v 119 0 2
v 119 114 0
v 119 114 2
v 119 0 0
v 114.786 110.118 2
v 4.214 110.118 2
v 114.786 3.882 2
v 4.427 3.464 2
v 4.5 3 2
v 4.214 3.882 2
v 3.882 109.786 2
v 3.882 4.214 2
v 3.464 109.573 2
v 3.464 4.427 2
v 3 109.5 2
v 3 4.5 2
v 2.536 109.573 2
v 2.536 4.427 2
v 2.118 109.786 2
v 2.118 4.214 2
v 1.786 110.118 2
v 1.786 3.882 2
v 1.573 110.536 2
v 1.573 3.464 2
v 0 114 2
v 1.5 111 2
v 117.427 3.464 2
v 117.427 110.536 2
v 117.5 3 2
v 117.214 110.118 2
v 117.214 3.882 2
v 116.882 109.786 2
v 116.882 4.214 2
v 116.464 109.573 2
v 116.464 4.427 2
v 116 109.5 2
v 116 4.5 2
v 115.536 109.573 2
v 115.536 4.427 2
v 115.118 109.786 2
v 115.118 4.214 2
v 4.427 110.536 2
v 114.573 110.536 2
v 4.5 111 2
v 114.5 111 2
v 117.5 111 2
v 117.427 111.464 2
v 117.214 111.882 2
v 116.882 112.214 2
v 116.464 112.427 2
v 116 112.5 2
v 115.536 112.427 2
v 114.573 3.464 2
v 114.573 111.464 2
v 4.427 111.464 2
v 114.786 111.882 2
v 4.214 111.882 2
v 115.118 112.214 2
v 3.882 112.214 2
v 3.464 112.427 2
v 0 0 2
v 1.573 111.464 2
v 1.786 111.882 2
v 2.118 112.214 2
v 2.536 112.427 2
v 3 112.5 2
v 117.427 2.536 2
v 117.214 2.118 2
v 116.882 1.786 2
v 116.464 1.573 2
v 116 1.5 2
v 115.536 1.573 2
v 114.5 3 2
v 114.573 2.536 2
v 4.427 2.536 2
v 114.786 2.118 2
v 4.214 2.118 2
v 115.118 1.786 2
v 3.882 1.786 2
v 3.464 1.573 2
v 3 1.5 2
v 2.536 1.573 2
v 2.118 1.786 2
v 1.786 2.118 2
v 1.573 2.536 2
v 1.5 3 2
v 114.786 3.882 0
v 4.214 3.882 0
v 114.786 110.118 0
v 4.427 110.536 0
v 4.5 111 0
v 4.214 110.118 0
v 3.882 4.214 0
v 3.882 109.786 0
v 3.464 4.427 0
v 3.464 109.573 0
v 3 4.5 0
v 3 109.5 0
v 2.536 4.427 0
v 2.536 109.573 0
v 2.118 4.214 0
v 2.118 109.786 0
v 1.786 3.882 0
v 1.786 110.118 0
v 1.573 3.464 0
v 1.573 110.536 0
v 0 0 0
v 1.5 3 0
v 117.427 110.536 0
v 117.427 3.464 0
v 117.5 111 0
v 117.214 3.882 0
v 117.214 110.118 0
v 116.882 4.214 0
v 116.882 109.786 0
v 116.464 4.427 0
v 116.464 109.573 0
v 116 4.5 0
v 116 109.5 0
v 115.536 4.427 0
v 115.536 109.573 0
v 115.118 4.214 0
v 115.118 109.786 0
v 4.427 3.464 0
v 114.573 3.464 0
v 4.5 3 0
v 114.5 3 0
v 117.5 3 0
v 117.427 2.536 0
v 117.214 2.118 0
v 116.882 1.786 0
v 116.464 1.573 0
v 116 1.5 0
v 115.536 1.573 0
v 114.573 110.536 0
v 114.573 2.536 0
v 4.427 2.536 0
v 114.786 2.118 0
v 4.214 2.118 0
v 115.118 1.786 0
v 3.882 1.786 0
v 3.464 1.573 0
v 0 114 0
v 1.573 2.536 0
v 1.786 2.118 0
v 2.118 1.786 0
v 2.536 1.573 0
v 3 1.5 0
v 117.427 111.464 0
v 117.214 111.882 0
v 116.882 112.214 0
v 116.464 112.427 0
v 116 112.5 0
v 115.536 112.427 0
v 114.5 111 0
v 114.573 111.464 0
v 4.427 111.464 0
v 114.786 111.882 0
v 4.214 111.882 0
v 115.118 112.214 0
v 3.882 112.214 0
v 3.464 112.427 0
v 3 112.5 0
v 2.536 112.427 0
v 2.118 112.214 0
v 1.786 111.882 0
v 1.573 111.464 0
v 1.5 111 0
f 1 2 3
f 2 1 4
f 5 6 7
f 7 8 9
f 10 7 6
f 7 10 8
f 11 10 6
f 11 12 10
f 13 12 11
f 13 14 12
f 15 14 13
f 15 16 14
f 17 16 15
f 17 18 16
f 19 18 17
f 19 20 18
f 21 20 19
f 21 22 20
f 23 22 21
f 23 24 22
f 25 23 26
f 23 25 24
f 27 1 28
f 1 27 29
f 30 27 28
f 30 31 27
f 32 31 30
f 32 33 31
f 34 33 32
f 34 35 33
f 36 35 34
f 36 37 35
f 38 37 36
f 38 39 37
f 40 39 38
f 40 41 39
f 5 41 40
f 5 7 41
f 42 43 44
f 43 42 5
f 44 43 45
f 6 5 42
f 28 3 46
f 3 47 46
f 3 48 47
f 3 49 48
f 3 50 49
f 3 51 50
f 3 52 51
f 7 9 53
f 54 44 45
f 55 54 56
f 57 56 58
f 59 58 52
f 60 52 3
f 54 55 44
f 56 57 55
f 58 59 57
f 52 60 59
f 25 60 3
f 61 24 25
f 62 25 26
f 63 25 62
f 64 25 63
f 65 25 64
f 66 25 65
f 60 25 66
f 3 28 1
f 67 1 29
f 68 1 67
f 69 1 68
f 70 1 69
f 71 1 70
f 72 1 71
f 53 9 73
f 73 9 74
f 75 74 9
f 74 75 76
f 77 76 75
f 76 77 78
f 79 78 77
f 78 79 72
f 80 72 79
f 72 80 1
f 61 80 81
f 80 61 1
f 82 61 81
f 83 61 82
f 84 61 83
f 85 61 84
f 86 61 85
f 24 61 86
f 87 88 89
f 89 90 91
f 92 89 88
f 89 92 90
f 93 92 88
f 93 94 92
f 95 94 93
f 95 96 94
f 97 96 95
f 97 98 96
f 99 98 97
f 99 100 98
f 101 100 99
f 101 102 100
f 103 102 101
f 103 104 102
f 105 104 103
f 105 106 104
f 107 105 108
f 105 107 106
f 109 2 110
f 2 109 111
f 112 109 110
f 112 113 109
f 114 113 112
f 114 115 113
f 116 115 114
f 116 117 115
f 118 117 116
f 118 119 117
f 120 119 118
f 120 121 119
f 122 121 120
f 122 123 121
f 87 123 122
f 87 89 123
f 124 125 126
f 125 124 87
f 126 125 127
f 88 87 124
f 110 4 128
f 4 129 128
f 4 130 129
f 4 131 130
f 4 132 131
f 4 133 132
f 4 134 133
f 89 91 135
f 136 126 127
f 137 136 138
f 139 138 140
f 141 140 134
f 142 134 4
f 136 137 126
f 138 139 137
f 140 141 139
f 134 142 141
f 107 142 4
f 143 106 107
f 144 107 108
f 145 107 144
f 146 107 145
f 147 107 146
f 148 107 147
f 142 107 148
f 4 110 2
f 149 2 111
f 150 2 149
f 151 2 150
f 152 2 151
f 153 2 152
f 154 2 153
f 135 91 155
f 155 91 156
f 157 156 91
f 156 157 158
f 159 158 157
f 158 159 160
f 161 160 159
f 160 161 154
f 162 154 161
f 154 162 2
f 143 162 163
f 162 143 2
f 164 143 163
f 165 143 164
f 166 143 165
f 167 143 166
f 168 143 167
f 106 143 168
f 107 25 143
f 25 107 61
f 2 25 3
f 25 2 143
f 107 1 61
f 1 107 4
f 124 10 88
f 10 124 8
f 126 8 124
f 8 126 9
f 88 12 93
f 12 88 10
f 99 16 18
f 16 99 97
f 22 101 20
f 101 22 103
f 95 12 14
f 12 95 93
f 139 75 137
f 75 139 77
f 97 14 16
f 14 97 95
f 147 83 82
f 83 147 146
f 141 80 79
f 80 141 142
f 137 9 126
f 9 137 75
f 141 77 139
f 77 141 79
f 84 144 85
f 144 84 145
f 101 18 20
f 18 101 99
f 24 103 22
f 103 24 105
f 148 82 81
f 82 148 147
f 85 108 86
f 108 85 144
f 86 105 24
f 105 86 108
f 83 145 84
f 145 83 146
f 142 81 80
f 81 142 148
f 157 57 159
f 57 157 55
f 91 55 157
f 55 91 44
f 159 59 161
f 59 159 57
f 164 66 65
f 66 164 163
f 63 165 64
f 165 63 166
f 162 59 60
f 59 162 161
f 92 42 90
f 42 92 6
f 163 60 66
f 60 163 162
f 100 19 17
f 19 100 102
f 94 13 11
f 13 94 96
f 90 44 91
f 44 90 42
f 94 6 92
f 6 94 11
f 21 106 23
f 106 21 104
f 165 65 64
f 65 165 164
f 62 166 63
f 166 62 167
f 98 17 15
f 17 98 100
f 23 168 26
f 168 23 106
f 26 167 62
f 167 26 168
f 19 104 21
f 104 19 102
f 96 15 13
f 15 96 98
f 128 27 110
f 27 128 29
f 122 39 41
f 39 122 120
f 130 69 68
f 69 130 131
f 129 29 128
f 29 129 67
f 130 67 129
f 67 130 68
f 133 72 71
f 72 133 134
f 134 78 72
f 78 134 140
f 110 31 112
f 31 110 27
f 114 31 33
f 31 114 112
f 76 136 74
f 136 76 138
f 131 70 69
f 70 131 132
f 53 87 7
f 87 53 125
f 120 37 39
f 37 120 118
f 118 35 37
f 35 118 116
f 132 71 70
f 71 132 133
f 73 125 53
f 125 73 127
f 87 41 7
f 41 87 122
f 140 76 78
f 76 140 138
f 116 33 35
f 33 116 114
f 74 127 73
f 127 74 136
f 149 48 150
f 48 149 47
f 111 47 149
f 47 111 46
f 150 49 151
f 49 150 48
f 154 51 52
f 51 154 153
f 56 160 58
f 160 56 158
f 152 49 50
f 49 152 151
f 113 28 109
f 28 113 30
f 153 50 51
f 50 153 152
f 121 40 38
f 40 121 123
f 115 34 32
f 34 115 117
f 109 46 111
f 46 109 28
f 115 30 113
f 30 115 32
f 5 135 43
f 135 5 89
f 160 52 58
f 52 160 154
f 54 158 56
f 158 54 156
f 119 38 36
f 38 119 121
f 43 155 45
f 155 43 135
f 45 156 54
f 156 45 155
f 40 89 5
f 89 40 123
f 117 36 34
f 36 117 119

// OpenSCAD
length = 119;
width = 114;

difference()
{
	cube([length, width, 2]);
	translate([3,3,0]) cylinder(h=2,r=1.5,$fn=20);
	translate([3,width-3,0]) cylinder(h=2,r=1.5,$fn=20);
	translate([length-3,3,0]) cylinder(h=2,r=1.5,$fn=20);
	translate([length-3,width-3,0]) cylinder(h=2,r=1.5,$fn=20);
}
